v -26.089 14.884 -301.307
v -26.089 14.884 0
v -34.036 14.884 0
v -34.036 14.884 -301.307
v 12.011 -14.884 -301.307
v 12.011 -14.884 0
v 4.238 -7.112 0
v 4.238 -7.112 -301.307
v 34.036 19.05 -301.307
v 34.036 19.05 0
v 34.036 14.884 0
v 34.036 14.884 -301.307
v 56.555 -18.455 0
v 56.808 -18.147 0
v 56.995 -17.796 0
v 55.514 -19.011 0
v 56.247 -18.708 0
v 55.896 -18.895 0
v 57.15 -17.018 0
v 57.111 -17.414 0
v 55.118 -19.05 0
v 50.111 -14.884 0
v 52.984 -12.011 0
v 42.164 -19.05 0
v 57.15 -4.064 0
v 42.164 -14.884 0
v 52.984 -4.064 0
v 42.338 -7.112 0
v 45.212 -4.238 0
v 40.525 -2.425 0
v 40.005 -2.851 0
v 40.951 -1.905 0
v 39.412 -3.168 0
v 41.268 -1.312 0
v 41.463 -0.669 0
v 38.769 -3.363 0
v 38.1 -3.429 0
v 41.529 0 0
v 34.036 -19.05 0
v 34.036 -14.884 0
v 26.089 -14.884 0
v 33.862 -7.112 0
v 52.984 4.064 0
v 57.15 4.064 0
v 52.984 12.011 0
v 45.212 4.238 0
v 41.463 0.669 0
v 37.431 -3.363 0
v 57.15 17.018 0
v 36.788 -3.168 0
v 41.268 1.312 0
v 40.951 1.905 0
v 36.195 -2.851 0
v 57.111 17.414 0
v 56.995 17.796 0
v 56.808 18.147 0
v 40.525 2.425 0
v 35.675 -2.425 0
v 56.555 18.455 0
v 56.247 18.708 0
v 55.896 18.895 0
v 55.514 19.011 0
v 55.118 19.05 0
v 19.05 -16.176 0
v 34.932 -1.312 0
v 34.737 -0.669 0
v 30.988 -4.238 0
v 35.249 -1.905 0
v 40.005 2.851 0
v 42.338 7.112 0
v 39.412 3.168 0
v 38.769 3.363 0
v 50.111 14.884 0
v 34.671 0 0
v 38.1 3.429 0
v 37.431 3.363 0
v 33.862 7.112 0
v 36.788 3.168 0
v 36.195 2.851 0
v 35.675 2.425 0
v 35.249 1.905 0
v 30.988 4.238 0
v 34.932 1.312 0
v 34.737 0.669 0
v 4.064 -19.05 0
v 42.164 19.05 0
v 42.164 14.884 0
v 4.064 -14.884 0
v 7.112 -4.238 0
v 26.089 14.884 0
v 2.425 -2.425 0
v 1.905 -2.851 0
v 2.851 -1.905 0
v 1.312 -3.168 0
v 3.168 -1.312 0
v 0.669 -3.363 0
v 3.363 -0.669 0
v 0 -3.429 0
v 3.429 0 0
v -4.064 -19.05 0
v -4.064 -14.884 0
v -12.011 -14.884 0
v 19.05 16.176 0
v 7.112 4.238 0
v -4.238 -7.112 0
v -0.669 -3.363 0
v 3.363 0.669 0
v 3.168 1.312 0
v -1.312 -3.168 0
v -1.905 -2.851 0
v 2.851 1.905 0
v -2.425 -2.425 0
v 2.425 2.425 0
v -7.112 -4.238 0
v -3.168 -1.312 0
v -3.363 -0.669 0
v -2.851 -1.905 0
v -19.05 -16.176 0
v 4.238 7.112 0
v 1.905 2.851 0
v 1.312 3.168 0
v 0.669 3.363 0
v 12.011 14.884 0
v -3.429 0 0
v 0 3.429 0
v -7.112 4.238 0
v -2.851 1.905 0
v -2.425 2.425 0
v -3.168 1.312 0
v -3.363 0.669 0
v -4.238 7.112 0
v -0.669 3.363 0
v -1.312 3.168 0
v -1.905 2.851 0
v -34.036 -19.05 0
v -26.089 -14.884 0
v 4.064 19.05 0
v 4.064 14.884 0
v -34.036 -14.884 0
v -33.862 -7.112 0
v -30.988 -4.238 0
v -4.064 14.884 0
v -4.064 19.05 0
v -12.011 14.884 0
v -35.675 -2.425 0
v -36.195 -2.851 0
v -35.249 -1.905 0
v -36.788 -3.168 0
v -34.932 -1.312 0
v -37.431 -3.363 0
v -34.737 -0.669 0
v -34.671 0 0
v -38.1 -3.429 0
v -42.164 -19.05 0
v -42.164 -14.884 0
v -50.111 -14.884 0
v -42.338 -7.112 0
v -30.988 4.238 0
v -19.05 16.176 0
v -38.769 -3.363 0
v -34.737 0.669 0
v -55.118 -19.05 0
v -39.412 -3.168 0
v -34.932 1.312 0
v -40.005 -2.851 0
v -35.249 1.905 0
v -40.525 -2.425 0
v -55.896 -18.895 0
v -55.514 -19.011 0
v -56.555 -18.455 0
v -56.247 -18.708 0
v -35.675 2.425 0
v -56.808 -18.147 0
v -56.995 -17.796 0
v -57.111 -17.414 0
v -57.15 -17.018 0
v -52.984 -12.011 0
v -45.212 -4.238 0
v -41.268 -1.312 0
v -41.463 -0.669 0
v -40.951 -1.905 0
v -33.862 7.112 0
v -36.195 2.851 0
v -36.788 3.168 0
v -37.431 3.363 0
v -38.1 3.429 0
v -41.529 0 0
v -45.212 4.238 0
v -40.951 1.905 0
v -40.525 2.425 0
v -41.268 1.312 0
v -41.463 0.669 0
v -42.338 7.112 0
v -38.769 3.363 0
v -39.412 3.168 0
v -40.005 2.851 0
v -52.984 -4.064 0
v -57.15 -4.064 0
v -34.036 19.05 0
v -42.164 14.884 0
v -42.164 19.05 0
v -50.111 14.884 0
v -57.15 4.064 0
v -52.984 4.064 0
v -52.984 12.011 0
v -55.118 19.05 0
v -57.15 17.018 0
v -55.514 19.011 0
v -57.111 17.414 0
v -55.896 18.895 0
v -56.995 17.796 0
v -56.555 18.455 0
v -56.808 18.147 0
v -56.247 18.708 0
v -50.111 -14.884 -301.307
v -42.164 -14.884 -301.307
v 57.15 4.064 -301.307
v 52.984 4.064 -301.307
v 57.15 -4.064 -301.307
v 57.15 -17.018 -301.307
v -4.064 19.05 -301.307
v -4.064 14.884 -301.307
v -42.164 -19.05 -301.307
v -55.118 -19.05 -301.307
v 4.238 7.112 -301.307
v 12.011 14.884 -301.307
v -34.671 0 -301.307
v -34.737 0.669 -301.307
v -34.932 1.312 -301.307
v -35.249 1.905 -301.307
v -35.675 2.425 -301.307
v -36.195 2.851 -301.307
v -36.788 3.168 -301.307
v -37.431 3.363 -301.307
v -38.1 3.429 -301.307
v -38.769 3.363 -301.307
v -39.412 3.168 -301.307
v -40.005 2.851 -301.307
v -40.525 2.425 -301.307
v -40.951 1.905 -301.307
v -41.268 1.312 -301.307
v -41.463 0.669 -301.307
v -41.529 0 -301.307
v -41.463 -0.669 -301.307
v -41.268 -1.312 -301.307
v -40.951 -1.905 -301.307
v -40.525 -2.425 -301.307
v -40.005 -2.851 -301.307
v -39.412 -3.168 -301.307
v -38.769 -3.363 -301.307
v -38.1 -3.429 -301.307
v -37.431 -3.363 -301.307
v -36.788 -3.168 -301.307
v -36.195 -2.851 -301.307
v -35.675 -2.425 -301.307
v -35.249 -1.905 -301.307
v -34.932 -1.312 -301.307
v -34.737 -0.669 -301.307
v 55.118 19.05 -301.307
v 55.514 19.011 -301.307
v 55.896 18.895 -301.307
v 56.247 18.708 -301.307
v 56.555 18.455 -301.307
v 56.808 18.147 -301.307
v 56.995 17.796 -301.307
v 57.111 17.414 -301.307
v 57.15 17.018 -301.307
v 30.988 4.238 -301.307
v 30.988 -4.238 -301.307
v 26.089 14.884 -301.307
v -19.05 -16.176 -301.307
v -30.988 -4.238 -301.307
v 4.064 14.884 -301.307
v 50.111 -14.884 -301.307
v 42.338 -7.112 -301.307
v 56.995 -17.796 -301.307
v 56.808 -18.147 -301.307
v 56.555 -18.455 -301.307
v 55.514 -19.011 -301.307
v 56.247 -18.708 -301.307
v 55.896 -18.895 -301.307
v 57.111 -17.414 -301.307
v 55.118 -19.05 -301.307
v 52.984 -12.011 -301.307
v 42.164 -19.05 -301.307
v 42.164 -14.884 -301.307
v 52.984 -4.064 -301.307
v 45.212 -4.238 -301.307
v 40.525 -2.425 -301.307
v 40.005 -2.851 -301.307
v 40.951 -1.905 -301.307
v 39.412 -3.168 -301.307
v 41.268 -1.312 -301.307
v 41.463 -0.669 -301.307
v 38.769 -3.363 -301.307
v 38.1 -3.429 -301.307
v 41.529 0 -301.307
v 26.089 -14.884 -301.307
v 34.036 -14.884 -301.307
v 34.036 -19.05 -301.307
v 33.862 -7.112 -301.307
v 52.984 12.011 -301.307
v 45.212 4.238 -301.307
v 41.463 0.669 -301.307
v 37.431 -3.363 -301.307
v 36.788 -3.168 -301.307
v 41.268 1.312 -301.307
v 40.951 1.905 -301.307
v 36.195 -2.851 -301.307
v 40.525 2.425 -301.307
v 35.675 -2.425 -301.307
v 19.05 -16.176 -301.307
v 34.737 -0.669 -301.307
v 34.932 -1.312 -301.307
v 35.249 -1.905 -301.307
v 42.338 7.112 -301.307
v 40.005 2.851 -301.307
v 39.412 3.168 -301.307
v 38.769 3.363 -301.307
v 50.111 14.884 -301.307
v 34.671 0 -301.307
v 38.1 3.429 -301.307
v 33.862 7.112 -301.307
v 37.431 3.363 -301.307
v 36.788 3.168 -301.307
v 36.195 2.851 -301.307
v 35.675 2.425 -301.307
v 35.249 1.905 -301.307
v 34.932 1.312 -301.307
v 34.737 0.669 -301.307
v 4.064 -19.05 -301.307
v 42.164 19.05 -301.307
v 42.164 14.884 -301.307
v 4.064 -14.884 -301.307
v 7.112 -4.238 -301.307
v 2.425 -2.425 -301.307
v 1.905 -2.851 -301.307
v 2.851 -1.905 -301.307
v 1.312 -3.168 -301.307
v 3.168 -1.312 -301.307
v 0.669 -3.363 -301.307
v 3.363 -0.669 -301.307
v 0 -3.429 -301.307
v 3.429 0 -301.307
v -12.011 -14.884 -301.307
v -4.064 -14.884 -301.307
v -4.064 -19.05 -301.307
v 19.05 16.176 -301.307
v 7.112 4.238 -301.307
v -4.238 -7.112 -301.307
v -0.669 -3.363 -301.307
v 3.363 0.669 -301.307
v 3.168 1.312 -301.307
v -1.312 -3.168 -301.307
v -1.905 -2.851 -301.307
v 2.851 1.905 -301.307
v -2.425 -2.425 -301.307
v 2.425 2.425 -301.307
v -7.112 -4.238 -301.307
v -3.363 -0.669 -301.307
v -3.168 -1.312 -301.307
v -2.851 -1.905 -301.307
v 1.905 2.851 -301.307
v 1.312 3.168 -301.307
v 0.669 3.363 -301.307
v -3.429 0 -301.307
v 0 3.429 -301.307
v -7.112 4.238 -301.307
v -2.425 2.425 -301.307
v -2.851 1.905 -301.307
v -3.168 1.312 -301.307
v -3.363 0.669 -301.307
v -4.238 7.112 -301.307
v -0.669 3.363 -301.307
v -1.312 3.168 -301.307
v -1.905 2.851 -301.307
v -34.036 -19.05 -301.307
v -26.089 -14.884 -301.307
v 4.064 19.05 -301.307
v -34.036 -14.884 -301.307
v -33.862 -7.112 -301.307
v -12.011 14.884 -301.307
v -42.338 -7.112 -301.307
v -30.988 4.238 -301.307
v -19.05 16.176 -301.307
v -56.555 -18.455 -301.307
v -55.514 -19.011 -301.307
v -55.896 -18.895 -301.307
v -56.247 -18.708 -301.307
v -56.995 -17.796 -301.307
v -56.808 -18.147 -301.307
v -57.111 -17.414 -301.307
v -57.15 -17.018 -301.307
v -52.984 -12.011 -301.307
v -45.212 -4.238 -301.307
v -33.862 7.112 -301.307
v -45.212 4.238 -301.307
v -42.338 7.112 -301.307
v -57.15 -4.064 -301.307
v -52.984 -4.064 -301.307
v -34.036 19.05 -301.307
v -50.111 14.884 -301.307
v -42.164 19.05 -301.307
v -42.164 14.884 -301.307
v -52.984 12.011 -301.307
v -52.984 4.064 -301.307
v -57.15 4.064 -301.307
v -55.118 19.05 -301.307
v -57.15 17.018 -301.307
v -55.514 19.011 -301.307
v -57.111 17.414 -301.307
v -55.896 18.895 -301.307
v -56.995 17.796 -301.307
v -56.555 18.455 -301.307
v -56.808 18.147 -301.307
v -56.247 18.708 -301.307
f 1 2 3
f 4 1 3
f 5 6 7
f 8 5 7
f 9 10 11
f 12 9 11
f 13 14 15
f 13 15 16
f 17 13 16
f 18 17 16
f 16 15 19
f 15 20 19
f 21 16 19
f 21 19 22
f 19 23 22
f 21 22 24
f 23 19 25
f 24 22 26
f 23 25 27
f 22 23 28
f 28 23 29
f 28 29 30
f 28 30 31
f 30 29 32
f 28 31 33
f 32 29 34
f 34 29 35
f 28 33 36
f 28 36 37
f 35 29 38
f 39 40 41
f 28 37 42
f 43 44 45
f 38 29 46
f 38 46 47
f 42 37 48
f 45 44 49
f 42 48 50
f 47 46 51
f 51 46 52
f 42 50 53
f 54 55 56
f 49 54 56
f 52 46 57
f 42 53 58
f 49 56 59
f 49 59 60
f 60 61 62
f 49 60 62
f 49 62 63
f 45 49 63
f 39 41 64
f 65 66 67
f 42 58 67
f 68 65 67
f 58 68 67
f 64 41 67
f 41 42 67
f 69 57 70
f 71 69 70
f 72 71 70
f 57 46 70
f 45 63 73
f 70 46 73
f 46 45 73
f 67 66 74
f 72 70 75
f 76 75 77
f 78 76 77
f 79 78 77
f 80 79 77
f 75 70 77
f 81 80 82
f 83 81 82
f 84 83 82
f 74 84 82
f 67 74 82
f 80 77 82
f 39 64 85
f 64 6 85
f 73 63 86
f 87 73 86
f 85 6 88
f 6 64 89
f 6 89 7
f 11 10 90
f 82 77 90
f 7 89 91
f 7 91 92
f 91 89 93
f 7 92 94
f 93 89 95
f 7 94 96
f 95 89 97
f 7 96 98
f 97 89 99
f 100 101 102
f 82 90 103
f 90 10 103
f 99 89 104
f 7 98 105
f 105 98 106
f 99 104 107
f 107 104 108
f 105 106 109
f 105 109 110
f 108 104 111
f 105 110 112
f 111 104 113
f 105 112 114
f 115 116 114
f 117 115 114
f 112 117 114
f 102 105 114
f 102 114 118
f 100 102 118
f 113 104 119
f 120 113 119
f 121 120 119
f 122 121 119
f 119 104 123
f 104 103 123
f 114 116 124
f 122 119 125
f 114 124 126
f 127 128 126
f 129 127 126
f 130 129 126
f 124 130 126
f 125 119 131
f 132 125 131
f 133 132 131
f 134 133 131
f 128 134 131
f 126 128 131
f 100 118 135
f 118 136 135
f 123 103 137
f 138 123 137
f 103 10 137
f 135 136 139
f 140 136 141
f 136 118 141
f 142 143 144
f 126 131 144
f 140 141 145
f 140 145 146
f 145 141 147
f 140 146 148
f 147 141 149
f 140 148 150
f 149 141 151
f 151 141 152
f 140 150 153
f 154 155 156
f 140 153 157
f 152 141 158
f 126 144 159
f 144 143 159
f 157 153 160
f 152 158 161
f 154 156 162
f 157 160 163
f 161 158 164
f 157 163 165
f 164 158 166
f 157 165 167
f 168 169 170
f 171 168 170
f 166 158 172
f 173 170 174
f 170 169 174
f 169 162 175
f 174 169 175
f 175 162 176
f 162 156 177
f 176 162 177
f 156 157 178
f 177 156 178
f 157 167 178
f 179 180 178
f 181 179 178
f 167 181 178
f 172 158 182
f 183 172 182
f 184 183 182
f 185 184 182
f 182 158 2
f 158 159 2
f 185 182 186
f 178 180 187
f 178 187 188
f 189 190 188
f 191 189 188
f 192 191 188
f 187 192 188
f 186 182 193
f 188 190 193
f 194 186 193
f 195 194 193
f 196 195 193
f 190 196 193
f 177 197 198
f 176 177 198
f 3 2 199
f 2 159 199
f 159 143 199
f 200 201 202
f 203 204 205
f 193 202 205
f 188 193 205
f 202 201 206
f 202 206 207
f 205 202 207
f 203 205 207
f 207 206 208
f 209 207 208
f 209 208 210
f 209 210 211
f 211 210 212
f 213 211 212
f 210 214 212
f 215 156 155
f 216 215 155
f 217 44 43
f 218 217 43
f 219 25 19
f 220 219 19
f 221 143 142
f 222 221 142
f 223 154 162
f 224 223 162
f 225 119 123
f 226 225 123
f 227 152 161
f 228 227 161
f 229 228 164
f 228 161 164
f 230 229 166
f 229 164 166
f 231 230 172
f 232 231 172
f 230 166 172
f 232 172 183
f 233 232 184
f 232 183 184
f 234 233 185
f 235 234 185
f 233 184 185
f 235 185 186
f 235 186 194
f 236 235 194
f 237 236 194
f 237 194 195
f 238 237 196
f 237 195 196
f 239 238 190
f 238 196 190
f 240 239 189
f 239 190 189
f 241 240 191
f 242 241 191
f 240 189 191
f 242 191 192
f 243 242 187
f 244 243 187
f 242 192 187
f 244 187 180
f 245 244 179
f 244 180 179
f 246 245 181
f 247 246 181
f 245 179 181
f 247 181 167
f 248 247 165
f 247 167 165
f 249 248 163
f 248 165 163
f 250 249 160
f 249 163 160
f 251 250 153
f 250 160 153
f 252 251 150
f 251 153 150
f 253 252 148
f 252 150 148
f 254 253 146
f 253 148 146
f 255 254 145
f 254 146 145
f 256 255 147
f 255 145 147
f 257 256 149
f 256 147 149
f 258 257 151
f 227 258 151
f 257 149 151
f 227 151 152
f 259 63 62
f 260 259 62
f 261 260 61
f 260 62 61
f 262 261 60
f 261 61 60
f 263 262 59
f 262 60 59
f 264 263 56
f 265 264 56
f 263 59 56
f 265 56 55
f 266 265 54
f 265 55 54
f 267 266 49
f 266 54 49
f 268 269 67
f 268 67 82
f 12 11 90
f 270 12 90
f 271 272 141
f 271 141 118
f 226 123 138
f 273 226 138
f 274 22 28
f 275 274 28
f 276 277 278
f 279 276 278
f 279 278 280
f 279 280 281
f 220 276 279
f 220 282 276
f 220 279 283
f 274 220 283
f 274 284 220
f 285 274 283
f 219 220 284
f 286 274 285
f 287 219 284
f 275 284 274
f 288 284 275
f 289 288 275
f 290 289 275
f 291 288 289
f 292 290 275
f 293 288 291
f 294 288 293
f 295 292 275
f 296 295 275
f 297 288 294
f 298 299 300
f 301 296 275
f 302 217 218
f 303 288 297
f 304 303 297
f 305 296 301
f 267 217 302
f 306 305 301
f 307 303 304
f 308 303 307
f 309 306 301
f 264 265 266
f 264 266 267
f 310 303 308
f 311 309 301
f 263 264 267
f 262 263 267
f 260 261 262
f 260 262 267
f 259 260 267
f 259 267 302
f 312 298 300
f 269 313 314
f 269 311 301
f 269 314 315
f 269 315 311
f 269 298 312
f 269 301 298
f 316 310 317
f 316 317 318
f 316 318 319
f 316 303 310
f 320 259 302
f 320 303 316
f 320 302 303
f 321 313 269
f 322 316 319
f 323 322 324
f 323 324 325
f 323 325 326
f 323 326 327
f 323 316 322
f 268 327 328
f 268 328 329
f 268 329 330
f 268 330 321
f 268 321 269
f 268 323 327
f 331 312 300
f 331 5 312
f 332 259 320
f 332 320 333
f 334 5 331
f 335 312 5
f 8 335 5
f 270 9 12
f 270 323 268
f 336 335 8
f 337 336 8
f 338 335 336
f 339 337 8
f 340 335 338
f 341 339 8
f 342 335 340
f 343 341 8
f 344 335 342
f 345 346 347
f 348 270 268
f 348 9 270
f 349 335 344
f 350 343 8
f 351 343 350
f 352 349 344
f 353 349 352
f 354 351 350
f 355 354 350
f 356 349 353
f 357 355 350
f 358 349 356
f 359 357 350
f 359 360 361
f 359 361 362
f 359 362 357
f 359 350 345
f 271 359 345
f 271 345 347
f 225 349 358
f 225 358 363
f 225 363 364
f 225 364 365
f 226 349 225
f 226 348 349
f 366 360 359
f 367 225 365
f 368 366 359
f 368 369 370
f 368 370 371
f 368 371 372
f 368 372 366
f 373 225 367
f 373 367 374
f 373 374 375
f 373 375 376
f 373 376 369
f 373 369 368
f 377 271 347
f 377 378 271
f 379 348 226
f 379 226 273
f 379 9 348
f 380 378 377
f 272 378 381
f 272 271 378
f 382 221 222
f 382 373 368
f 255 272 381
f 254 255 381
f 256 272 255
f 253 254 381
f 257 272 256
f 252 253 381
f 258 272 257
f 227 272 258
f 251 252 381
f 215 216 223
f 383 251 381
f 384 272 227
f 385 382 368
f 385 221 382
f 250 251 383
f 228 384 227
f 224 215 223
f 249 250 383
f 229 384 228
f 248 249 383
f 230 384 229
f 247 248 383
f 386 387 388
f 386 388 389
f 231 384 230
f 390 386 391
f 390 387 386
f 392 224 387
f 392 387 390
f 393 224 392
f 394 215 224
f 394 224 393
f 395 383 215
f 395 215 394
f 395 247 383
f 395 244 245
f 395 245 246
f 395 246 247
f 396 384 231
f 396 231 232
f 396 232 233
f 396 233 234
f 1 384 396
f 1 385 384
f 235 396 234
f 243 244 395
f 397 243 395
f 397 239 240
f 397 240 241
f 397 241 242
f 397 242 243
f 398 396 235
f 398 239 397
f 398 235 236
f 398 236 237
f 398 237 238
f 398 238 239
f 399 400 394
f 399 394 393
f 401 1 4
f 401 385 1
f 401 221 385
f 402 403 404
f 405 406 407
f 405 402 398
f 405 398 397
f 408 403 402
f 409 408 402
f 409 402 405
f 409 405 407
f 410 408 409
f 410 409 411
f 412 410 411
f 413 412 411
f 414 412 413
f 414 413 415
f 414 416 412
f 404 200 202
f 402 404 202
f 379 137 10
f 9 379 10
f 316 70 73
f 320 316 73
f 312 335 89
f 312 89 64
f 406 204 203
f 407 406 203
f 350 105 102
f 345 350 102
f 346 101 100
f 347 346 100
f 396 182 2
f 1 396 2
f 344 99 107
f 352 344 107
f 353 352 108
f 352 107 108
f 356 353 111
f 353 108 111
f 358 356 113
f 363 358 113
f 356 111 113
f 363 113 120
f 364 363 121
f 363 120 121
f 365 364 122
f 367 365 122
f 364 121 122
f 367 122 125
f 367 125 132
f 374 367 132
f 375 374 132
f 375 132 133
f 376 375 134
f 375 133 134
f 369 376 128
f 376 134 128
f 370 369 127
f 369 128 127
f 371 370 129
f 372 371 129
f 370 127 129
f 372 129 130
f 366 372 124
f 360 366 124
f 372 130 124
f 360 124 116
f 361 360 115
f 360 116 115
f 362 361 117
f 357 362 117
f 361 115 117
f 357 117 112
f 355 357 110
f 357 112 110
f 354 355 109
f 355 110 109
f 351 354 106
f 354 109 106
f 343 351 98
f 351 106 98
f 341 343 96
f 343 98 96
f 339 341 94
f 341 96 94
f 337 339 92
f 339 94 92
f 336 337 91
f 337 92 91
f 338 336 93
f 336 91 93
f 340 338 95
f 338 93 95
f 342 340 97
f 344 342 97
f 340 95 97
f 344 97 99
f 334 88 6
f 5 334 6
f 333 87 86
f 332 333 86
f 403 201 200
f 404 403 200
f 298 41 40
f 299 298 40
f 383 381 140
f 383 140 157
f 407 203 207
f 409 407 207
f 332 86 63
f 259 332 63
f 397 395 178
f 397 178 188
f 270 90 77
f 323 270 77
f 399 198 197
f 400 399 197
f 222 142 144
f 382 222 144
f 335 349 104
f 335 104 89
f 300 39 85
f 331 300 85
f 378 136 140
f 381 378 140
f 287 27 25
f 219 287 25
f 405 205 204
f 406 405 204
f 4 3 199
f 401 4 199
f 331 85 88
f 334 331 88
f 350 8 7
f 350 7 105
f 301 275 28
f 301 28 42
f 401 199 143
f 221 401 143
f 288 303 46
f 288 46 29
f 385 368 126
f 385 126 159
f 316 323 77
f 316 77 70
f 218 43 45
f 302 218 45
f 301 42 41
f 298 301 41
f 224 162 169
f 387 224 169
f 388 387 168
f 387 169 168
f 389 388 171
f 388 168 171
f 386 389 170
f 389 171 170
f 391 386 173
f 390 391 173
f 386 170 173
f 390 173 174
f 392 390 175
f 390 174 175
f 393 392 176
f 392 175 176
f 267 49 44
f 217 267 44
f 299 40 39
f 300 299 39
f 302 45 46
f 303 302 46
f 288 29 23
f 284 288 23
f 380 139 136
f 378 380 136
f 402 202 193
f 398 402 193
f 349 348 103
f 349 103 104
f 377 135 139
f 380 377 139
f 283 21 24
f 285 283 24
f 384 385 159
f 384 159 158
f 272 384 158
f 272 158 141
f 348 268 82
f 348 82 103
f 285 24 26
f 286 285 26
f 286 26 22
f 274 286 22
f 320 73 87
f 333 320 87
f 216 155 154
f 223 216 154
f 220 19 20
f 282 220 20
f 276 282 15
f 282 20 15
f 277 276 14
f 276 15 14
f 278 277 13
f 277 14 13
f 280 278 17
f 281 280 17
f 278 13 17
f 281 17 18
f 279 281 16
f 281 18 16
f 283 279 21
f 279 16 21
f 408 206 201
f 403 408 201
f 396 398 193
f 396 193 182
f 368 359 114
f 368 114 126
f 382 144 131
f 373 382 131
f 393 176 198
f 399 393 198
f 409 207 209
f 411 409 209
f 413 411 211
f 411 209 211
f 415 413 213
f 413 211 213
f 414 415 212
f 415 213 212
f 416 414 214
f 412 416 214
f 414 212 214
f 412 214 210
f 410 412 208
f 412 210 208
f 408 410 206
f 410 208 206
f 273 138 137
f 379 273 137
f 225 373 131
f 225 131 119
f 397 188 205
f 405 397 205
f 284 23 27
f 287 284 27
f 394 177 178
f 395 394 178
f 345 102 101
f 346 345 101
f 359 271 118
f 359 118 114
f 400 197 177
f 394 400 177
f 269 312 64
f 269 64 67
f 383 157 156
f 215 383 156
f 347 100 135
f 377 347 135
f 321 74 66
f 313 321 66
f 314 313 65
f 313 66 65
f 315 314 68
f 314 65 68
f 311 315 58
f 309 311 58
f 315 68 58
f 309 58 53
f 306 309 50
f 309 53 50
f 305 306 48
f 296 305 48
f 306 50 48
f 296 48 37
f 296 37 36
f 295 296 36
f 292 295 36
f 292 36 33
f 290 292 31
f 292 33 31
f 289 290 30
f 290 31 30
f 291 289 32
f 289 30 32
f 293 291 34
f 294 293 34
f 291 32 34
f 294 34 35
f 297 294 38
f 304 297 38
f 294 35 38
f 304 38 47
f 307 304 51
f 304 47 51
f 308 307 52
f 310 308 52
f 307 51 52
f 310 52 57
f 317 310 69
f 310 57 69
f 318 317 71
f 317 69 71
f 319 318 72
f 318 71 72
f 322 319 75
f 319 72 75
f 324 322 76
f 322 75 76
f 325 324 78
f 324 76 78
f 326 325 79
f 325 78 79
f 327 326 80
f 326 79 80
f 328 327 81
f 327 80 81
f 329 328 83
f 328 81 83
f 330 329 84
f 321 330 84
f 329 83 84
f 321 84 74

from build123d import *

# Parameters (mm, degrees)
SKETCH1_R      = 3.429
FINALCUT_DEPTH = 301.3074238


with BuildPart() as part:
    # Sketch1 → FinalCut (new body)
    with BuildSketch(Plane.XY):
        with BuildLine():
            Line((-34.036, -19.05), (-34.036, -14.8844))
            Line((-34.036, -14.8844), (-26.089281959, -14.8844))
            Line((-26.089281959, -14.8844), (-33.861681959, -7.112))
            Line((-33.861681959, -7.112), (-42.338318041, -7.112))
            Line((-42.338318041, -7.112), (-50.110718041, -14.8844))
            Line((-50.110718041, -14.8844), (-42.164, -14.8844))
            Line((-42.164, -14.8844), (-42.164, -19.05))
            Line((-42.164, -19.05), (-55.118, -19.05))
            ThreePointArc((-55.118, -19.05), (-56.554840979, -18.454840979), (-57.15, -17.018))
            Line((-57.15, -17.018), (-57.15, -4.064))
            Line((-57.15, -4.064), (-52.9844, -4.064))
            Line((-52.9844, -4.064), (-52.9844, -12.010718041))
            Line((-52.9844, -12.010718041), (-45.212, -4.238318041))
            Line((-45.212, -4.238318041), (-45.212, 4.238318041))
            Line((-45.212, 4.238318041), (-52.9844, 12.010718041))
            Line((-52.9844, 12.010718041), (-52.9844, 4.064))
            Line((-52.9844, 4.064), (-57.15, 4.064))
            Line((-57.15, 4.064), (-57.15, 17.018))
            ThreePointArc((-57.15, 17.018), (-56.554840979, 18.454840979), (-55.118, 19.05))
            Line((-55.118, 19.05), (-42.164, 19.05))
            Line((-42.164, 19.05), (-42.164, 14.8844))
            Line((-42.164, 14.8844), (-50.110718041, 14.8844))
            Line((-50.110718041, 14.8844), (-42.338318041, 7.112))
            Line((-42.338318041, 7.112), (-33.861681959, 7.112))
            Line((-33.861681959, 7.112), (-26.089281959, 14.8844))
            Line((-26.089281959, 14.8844), (-34.036, 14.8844))
            Line((-34.036, 14.8844), (-34.036, 19.05))
            Line((-34.036, 19.05), (-4.064, 19.05))
            Line((-4.064, 19.05), (-4.064, 14.8844))
            Line((-4.064, 14.8844), (-12.010718041, 14.8844))
            Line((-12.010718041, 14.8844), (-4.238318041, 7.112))
            Line((-4.238318041, 7.112), (4.238318041, 7.112))
            Line((4.238318041, 7.112), (12.010718041, 14.8844))
            Line((12.010718041, 14.8844), (4.064, 14.8844))
            Line((4.064, 14.8844), (4.064, 19.05))
            Line((4.064, 19.05), (34.036, 19.05))
            Line((34.036, 19.05), (34.036, 14.8844))
            Line((34.036, 14.8844), (26.089281959, 14.8844))
            Line((26.089281959, 14.8844), (33.861681959, 7.112))
            Line((33.861681959, 7.112), (42.338318041, 7.112))
            Line((42.338318041, 7.112), (50.110718041, 14.8844))
            Line((50.110718041, 14.8844), (42.164, 14.8844))
            Line((42.164, 14.8844), (42.164, 19.05))
            Line((42.164, 19.05), (55.118, 19.05))
            ThreePointArc((55.118, 19.05), (56.554840979, 18.454840979), (57.15, 17.018))
            Line((57.15, 17.018), (57.15, 4.064))
            Line((57.15, 4.064), (52.9844, 4.064))
            Line((52.9844, 4.064), (52.9844, 12.010718041))
            Line((52.9844, 12.010718041), (45.212, 4.238318041))
            Line((45.212, 4.238318041), (45.212, -4.238318041))
            Line((45.212, -4.238318041), (52.9844, -12.010718041))
            Line((52.9844, -12.010718041), (52.9844, -4.064))
            Line((52.9844, -4.064), (57.15, -4.064))
            Line((57.15, -4.064), (57.15, -17.018))
            ThreePointArc((57.15, -17.018), (56.554840979, -18.454840979), (55.118, -19.05))
            Line((55.118, -19.05), (42.164, -19.05))
            Line((42.164, -19.05), (42.164, -14.8844))
            Line((42.164, -14.8844), (50.110718041, -14.8844))
            Line((50.110718041, -14.8844), (42.338318041, -7.112))
            Line((42.338318041, -7.112), (33.861681959, -7.112))
            Line((33.861681959, -7.112), (26.089281959, -14.8844))
            Line((26.089281959, -14.8844), (34.036, -14.8844))
            Line((34.036, -14.8844), (34.036, -19.05))
            Line((34.036, -19.05), (4.064, -19.05))
            Line((4.064, -19.05), (4.064, -14.8844))
            Line((4.064, -14.8844), (12.010718041, -14.8844))
            Line((12.010718041, -14.8844), (4.238318041, -7.112))
            Line((4.238318041, -7.112), (-4.238318041, -7.112))
            Line((-4.238318041, -7.112), (-12.010718041, -14.8844))
            Line((-12.010718041, -14.8844), (-4.064, -14.8844))
            Line((-4.064, -14.8844), (-4.064, -19.05))
            Line((-4.064, -19.05), (-34.036, -19.05))
        make_face()
        with Locations((38.1, 0)):
            Circle(SKETCH1_R, mode=Mode.SUBTRACT)
        with Locations((-38.1, 0)):
            Circle(SKETCH1_R, mode=Mode.SUBTRACT)
        Circle(SKETCH1_R, mode=Mode.SUBTRACT)
        Polygon((-7.112, 4.238318041), (-19.05, 16.176318041), (-30.988, 4.238318041), (-30.988, -4.238318041), (-19.05, -16.176318041), (-7.112, -4.238318041), align=None, mode=Mode.SUBTRACT)
        Polygon((7.112, 4.238318041), (7.112, -4.238318041), (19.05, -16.176318041), (30.988, -4.238318041), (30.988, 4.238318041), (19.05, 16.176318041), align=None, mode=Mode.SUBTRACT)
    extrude(amount=-FINALCUT_DEPTH)


solid = part.part
